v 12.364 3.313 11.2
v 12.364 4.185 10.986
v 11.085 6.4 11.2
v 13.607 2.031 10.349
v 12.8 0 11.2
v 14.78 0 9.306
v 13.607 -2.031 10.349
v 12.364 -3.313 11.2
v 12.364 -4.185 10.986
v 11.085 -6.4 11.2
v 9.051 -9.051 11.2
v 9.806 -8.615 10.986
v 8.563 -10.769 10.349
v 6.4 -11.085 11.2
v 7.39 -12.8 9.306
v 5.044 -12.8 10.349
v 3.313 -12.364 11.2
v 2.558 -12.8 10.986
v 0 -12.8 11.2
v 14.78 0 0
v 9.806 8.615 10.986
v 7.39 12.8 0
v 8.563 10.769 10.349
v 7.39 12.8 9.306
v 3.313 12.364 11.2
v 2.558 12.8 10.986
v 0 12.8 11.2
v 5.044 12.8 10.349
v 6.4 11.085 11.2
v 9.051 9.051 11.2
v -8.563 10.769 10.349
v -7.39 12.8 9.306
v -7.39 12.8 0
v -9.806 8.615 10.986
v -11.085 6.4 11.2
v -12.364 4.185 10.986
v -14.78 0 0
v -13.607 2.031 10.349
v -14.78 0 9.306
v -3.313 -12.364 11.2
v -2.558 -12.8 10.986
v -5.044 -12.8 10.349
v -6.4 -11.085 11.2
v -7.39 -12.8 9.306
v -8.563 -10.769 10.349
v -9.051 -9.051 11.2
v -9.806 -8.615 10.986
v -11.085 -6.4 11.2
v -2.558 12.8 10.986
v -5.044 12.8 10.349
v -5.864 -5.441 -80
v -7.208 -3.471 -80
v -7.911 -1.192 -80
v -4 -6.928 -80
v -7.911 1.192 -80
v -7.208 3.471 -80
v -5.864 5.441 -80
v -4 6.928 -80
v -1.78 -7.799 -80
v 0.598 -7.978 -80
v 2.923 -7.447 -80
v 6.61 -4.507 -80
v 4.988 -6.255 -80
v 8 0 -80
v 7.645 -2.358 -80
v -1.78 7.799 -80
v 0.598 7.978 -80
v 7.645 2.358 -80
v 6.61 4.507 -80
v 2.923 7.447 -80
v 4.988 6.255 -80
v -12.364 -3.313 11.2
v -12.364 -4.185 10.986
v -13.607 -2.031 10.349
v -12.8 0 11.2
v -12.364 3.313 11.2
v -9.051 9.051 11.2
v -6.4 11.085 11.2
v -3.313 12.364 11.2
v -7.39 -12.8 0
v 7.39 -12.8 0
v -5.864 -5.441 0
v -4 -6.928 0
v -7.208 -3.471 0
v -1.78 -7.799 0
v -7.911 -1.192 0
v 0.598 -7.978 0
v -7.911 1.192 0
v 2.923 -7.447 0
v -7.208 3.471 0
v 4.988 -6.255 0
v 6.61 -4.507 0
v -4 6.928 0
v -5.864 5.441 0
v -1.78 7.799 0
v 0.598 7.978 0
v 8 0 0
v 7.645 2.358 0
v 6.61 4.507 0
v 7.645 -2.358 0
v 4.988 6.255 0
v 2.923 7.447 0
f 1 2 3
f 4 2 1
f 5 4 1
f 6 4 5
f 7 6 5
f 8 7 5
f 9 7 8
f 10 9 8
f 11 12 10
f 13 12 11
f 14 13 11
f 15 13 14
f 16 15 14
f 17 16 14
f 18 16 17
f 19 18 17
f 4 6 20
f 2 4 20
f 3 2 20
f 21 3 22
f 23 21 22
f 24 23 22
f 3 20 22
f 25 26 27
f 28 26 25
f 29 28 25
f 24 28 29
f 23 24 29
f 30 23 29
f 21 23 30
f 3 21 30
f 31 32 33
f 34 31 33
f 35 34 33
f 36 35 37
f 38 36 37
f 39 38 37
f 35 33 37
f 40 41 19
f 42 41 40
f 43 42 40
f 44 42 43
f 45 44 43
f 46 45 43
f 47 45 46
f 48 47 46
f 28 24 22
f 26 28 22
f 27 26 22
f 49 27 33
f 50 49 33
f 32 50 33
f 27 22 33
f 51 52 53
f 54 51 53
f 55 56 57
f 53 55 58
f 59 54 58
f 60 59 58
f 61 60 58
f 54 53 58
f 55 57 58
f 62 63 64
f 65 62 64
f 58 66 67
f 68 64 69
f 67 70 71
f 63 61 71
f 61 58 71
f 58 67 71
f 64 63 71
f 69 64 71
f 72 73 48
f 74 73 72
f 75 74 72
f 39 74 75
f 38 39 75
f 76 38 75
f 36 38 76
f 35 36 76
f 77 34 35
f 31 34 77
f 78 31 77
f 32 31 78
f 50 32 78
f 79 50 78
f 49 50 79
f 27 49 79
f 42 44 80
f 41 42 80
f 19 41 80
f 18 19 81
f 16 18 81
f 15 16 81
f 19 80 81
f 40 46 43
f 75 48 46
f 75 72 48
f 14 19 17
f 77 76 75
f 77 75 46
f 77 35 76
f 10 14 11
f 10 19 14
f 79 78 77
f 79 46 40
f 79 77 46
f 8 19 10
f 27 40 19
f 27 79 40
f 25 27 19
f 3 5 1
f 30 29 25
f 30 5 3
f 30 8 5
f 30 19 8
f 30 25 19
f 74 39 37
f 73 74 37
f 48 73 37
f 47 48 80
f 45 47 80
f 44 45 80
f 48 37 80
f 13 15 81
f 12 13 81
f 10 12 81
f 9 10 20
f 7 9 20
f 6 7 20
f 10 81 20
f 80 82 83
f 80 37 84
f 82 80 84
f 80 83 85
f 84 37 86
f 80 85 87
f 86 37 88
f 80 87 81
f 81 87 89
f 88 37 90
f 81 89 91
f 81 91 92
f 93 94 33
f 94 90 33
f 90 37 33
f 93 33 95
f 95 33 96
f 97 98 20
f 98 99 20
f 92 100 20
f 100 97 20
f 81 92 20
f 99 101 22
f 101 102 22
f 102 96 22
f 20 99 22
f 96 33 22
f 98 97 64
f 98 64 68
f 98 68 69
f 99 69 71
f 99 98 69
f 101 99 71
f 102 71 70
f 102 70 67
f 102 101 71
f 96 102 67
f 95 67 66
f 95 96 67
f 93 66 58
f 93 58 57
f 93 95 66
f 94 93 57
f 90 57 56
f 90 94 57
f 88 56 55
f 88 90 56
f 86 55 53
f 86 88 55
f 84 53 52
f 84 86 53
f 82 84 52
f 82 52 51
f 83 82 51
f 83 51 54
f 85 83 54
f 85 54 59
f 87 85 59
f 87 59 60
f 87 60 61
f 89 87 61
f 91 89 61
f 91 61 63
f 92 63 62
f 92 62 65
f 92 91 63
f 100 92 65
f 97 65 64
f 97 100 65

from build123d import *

# Parameters (mm, degrees)
F2_DEPTH = 11.2
F3_R     = 8
F4_DEPTH = 80


with BuildPart() as f2:
    # F1 (on Top) → F2 (new body)
    with BuildSketch(Plane.XY):
        Polygon((7.3900834456, 12.8), (-7.3900834456, 12.8), (-14.7801668913, 0), (-7.3900834456, -12.8), (7.3900834456, -12.8), (14.7801668913, 0), align=None)
    extrude(amount=F2_DEPTH)

    # F3 (on Top) → F4 (join)
    with BuildSketch(Plane.XY):
        Circle(F3_R)
    extrude(amount=-F4_DEPTH)

    # F5 (on Right) → F6 (revolve, cut)
    with BuildSketch(Plane.YZ):
        with BuildLine():
            Line((30, 0), (30, 20))
            Line((30, 20), (0, 20))
            Line((0, 20), (0, 15.8325018302))
            ThreePointArc((0, 15.8325018302), (12.5827269819, 11.3784010225), (19.5609805226, 0))
            Line((19.5609805226, 0), (30, 0))
        make_face()
    revolve(axis=Axis((0, 0, 17.9162509151), (0, 0, -1)), mode=Mode.SUBTRACT)


solid = f2.part
